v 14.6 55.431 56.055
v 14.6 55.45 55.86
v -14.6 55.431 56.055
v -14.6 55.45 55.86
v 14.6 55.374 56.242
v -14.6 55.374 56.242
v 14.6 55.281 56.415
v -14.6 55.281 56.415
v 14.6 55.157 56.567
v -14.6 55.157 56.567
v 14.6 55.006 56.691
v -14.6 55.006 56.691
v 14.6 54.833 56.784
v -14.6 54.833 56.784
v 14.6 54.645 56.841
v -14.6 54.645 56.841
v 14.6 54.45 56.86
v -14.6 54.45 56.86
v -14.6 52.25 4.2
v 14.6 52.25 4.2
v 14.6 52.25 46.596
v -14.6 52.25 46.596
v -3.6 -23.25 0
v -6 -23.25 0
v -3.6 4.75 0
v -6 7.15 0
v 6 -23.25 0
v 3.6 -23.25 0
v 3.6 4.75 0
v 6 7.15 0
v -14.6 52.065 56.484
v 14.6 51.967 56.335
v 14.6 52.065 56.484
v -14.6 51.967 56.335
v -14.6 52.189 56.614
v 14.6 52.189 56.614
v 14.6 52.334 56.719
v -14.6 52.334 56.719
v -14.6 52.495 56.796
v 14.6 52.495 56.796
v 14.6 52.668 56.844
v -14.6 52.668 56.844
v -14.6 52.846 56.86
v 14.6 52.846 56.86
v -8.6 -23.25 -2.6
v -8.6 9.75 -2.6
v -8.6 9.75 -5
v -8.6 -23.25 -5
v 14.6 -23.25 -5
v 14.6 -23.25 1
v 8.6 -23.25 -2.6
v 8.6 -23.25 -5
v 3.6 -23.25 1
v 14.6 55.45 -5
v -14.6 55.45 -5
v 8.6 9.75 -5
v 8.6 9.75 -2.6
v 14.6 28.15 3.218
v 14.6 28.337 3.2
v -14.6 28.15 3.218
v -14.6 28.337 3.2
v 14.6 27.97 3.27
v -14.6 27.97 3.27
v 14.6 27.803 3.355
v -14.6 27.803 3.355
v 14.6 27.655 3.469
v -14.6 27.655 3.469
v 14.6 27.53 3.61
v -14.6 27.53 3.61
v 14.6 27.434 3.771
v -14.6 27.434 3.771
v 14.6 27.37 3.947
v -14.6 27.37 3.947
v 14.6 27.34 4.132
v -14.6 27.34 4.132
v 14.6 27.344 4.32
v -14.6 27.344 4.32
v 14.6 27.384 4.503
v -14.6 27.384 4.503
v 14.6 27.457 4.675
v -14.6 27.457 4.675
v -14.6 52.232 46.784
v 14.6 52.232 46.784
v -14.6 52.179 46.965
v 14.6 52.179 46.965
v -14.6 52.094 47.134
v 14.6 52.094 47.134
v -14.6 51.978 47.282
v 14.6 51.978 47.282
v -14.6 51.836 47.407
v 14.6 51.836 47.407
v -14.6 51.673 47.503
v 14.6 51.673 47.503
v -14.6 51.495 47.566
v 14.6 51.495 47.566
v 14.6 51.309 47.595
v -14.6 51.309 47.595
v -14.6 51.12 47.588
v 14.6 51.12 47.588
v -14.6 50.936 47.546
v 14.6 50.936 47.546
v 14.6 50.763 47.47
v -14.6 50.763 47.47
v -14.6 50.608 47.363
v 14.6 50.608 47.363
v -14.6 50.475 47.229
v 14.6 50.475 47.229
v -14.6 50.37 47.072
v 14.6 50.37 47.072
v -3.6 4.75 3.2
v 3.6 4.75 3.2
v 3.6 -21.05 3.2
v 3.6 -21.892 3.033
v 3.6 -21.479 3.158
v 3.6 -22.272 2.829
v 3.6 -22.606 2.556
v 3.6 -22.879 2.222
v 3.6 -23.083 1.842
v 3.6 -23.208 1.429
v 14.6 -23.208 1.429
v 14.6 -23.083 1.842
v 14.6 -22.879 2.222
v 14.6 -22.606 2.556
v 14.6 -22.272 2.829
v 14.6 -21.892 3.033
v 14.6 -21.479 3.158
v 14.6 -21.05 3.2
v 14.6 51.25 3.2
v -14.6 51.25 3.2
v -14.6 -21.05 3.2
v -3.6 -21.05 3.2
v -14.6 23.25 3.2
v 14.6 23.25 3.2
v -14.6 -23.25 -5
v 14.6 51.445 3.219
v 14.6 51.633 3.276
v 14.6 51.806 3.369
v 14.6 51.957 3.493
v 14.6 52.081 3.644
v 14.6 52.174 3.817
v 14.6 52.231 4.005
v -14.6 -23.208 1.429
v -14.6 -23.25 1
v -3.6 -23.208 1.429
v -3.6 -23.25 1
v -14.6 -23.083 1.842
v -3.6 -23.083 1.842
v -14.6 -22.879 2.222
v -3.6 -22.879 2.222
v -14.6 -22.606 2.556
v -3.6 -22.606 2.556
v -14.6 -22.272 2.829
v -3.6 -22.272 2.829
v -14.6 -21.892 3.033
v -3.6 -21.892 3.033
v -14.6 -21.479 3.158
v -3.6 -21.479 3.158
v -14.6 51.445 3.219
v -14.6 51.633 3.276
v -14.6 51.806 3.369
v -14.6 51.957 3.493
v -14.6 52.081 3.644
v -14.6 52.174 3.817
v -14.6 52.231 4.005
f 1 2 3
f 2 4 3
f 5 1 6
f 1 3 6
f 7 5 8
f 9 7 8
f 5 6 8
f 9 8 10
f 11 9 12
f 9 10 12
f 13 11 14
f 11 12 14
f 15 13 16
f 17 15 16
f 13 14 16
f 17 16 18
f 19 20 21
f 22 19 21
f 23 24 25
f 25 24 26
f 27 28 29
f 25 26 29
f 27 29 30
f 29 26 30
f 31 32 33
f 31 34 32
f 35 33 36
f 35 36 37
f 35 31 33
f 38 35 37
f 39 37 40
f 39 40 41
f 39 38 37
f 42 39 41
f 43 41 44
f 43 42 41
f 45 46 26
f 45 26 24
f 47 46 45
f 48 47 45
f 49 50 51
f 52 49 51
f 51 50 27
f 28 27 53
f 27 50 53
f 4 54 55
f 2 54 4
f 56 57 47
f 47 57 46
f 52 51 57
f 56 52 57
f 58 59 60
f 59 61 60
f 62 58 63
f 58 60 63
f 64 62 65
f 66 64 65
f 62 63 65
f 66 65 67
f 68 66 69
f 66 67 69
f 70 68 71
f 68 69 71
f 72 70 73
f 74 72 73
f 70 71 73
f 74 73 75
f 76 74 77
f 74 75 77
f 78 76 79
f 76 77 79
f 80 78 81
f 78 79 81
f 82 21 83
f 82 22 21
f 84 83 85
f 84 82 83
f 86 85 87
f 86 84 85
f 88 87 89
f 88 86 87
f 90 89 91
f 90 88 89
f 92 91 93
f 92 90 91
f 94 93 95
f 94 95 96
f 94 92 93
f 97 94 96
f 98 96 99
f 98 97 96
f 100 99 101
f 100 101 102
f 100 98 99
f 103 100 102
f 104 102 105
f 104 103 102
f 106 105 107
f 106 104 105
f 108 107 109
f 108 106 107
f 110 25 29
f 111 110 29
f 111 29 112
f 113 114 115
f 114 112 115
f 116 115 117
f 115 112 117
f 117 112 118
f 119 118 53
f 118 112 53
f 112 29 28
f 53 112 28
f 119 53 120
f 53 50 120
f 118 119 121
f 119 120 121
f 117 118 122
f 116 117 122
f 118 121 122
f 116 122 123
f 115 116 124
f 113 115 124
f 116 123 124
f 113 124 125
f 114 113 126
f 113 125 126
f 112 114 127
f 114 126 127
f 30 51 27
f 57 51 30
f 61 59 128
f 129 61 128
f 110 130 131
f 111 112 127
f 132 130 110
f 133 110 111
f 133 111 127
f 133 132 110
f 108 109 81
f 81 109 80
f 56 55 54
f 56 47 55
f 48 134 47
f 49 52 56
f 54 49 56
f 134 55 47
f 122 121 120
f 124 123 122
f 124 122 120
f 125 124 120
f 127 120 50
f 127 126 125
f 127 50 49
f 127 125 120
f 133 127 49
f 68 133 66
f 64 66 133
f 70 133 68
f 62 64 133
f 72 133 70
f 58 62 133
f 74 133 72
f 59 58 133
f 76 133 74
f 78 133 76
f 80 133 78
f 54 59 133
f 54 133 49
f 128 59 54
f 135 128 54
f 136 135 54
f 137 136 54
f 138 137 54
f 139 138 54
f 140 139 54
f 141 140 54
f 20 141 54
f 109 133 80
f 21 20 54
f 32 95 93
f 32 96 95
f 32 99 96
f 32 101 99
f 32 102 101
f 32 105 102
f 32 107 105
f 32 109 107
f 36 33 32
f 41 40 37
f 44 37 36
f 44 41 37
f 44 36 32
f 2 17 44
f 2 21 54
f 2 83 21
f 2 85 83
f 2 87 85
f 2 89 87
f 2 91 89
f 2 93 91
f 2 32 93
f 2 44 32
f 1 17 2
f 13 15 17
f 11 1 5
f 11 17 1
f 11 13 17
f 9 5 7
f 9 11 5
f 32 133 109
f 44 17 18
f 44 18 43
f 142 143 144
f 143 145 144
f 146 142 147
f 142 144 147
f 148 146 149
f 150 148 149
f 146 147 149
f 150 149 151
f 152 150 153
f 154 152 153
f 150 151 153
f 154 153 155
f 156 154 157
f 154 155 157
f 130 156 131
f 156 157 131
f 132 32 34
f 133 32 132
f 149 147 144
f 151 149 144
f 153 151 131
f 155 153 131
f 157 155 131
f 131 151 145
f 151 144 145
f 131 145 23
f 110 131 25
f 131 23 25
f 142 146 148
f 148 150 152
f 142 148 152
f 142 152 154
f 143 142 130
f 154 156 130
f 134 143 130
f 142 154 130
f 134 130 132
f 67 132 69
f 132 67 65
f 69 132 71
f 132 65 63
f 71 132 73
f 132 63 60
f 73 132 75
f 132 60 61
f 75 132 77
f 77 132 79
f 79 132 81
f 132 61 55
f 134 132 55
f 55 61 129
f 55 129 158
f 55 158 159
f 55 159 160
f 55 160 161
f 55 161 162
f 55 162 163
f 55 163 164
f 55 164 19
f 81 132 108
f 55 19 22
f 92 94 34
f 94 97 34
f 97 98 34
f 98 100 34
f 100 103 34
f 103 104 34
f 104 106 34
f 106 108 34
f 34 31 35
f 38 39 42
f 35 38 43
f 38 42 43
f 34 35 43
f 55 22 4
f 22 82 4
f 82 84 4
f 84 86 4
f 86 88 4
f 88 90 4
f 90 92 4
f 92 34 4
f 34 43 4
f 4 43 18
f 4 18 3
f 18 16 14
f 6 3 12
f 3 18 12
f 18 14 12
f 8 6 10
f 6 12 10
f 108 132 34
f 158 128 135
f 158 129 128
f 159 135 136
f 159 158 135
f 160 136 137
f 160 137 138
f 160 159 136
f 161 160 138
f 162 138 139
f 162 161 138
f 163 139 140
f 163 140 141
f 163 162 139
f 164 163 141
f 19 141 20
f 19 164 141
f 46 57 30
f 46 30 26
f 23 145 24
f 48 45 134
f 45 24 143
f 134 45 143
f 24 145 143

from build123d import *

# Parameters (mm, degrees)
PAD002_DEPTH = 5
PAD001_DEPTH = 29.2
FILLET001_R  = 1
PAD_DEPTH    = 3.2
FILLET_R     = 2.2
CHAMFER_SIZE = 2.6


with BuildPart() as body002:
    # Sketch002 (on Face1 of ReferenceFillet) → Pad002 (new body)
    with BuildSketch(Plane(origin=(0, 0, 0), x_dir=(1, 0, 0), z_dir=(0, 0, -1))):
        Polygon((14.6, -55.45), (14.6, 23.25), (8.6, 23.25), (8.6, -9.75), (-8.6, -9.75), (-8.6, 23.25), (-14.6, 23.25), (-14.6, -55.45), align=None)
    extrude(amount=PAD002_DEPTH)


with BuildPart() as body001:
    # Sketch001 (on Face1 of Binder) → Pad001 (new body)
    with BuildSketch(Plane.YZ.offset(14.6)):
        Polygon((23.25, 0), (55.45, 0), (55.45, 56.859816), (52.25, 56.859816), (23.25, 3.2), align=None)
        Polygon((26.660087, 3.2), (52.25, 3.2), (52.25, 50.55), align=None, mode=Mode.SUBTRACT)
    extrude(amount=-PAD001_DEPTH)

    # Fillet001
    fillet001_edges = [body001.edges().sort_by_distance(p)[0] for p in [
        (0, 52.25, 3.2),
        (0, 26.660087, 3.2),
        (0, 52.25, 50.55),
        (0, 52.25, 56.859816),
        (0, 55.45, 56.859816),
    ]]
    fillet(fillet001_edges, radius=FILLET001_R)


with BuildPart() as chamfer_body:
    # Sketch → Pad (new body)
    with BuildSketch(Plane.XY):
        Polygon((-14.6, 23.25), (-14.6, -23.25), (-3.6, -23.25), (-3.6, 4.75), (3.6, 4.75), (3.6, -23.25), (14.6, -23.25), (14.6, 23.25), align=None)
    extrude(amount=PAD_DEPTH)

    # Fillet
    fillet_edges = [chamfer_body.edges().sort_by_distance(p)[0] for p in [
        (9.1, -23.25, 3.2),
        (-9.1, -23.25, 3.2),
    ]]
    fillet(fillet_edges, radius=FILLET_R)

    # Fusion: union Body002, Body001
    add(body002.part)
    add(body001.part)

    # Chamfer
    chamfer_edges = [chamfer_body.edges().sort_by_distance(p)[0] for p in [
        (-8.6, -6.75, 0),
        (0, 9.75, 0),
        (8.6, -6.75, 0),
    ]]
    chamfer(chamfer_edges, length=CHAMFER_SIZE)


solid = chamfer_body.part
